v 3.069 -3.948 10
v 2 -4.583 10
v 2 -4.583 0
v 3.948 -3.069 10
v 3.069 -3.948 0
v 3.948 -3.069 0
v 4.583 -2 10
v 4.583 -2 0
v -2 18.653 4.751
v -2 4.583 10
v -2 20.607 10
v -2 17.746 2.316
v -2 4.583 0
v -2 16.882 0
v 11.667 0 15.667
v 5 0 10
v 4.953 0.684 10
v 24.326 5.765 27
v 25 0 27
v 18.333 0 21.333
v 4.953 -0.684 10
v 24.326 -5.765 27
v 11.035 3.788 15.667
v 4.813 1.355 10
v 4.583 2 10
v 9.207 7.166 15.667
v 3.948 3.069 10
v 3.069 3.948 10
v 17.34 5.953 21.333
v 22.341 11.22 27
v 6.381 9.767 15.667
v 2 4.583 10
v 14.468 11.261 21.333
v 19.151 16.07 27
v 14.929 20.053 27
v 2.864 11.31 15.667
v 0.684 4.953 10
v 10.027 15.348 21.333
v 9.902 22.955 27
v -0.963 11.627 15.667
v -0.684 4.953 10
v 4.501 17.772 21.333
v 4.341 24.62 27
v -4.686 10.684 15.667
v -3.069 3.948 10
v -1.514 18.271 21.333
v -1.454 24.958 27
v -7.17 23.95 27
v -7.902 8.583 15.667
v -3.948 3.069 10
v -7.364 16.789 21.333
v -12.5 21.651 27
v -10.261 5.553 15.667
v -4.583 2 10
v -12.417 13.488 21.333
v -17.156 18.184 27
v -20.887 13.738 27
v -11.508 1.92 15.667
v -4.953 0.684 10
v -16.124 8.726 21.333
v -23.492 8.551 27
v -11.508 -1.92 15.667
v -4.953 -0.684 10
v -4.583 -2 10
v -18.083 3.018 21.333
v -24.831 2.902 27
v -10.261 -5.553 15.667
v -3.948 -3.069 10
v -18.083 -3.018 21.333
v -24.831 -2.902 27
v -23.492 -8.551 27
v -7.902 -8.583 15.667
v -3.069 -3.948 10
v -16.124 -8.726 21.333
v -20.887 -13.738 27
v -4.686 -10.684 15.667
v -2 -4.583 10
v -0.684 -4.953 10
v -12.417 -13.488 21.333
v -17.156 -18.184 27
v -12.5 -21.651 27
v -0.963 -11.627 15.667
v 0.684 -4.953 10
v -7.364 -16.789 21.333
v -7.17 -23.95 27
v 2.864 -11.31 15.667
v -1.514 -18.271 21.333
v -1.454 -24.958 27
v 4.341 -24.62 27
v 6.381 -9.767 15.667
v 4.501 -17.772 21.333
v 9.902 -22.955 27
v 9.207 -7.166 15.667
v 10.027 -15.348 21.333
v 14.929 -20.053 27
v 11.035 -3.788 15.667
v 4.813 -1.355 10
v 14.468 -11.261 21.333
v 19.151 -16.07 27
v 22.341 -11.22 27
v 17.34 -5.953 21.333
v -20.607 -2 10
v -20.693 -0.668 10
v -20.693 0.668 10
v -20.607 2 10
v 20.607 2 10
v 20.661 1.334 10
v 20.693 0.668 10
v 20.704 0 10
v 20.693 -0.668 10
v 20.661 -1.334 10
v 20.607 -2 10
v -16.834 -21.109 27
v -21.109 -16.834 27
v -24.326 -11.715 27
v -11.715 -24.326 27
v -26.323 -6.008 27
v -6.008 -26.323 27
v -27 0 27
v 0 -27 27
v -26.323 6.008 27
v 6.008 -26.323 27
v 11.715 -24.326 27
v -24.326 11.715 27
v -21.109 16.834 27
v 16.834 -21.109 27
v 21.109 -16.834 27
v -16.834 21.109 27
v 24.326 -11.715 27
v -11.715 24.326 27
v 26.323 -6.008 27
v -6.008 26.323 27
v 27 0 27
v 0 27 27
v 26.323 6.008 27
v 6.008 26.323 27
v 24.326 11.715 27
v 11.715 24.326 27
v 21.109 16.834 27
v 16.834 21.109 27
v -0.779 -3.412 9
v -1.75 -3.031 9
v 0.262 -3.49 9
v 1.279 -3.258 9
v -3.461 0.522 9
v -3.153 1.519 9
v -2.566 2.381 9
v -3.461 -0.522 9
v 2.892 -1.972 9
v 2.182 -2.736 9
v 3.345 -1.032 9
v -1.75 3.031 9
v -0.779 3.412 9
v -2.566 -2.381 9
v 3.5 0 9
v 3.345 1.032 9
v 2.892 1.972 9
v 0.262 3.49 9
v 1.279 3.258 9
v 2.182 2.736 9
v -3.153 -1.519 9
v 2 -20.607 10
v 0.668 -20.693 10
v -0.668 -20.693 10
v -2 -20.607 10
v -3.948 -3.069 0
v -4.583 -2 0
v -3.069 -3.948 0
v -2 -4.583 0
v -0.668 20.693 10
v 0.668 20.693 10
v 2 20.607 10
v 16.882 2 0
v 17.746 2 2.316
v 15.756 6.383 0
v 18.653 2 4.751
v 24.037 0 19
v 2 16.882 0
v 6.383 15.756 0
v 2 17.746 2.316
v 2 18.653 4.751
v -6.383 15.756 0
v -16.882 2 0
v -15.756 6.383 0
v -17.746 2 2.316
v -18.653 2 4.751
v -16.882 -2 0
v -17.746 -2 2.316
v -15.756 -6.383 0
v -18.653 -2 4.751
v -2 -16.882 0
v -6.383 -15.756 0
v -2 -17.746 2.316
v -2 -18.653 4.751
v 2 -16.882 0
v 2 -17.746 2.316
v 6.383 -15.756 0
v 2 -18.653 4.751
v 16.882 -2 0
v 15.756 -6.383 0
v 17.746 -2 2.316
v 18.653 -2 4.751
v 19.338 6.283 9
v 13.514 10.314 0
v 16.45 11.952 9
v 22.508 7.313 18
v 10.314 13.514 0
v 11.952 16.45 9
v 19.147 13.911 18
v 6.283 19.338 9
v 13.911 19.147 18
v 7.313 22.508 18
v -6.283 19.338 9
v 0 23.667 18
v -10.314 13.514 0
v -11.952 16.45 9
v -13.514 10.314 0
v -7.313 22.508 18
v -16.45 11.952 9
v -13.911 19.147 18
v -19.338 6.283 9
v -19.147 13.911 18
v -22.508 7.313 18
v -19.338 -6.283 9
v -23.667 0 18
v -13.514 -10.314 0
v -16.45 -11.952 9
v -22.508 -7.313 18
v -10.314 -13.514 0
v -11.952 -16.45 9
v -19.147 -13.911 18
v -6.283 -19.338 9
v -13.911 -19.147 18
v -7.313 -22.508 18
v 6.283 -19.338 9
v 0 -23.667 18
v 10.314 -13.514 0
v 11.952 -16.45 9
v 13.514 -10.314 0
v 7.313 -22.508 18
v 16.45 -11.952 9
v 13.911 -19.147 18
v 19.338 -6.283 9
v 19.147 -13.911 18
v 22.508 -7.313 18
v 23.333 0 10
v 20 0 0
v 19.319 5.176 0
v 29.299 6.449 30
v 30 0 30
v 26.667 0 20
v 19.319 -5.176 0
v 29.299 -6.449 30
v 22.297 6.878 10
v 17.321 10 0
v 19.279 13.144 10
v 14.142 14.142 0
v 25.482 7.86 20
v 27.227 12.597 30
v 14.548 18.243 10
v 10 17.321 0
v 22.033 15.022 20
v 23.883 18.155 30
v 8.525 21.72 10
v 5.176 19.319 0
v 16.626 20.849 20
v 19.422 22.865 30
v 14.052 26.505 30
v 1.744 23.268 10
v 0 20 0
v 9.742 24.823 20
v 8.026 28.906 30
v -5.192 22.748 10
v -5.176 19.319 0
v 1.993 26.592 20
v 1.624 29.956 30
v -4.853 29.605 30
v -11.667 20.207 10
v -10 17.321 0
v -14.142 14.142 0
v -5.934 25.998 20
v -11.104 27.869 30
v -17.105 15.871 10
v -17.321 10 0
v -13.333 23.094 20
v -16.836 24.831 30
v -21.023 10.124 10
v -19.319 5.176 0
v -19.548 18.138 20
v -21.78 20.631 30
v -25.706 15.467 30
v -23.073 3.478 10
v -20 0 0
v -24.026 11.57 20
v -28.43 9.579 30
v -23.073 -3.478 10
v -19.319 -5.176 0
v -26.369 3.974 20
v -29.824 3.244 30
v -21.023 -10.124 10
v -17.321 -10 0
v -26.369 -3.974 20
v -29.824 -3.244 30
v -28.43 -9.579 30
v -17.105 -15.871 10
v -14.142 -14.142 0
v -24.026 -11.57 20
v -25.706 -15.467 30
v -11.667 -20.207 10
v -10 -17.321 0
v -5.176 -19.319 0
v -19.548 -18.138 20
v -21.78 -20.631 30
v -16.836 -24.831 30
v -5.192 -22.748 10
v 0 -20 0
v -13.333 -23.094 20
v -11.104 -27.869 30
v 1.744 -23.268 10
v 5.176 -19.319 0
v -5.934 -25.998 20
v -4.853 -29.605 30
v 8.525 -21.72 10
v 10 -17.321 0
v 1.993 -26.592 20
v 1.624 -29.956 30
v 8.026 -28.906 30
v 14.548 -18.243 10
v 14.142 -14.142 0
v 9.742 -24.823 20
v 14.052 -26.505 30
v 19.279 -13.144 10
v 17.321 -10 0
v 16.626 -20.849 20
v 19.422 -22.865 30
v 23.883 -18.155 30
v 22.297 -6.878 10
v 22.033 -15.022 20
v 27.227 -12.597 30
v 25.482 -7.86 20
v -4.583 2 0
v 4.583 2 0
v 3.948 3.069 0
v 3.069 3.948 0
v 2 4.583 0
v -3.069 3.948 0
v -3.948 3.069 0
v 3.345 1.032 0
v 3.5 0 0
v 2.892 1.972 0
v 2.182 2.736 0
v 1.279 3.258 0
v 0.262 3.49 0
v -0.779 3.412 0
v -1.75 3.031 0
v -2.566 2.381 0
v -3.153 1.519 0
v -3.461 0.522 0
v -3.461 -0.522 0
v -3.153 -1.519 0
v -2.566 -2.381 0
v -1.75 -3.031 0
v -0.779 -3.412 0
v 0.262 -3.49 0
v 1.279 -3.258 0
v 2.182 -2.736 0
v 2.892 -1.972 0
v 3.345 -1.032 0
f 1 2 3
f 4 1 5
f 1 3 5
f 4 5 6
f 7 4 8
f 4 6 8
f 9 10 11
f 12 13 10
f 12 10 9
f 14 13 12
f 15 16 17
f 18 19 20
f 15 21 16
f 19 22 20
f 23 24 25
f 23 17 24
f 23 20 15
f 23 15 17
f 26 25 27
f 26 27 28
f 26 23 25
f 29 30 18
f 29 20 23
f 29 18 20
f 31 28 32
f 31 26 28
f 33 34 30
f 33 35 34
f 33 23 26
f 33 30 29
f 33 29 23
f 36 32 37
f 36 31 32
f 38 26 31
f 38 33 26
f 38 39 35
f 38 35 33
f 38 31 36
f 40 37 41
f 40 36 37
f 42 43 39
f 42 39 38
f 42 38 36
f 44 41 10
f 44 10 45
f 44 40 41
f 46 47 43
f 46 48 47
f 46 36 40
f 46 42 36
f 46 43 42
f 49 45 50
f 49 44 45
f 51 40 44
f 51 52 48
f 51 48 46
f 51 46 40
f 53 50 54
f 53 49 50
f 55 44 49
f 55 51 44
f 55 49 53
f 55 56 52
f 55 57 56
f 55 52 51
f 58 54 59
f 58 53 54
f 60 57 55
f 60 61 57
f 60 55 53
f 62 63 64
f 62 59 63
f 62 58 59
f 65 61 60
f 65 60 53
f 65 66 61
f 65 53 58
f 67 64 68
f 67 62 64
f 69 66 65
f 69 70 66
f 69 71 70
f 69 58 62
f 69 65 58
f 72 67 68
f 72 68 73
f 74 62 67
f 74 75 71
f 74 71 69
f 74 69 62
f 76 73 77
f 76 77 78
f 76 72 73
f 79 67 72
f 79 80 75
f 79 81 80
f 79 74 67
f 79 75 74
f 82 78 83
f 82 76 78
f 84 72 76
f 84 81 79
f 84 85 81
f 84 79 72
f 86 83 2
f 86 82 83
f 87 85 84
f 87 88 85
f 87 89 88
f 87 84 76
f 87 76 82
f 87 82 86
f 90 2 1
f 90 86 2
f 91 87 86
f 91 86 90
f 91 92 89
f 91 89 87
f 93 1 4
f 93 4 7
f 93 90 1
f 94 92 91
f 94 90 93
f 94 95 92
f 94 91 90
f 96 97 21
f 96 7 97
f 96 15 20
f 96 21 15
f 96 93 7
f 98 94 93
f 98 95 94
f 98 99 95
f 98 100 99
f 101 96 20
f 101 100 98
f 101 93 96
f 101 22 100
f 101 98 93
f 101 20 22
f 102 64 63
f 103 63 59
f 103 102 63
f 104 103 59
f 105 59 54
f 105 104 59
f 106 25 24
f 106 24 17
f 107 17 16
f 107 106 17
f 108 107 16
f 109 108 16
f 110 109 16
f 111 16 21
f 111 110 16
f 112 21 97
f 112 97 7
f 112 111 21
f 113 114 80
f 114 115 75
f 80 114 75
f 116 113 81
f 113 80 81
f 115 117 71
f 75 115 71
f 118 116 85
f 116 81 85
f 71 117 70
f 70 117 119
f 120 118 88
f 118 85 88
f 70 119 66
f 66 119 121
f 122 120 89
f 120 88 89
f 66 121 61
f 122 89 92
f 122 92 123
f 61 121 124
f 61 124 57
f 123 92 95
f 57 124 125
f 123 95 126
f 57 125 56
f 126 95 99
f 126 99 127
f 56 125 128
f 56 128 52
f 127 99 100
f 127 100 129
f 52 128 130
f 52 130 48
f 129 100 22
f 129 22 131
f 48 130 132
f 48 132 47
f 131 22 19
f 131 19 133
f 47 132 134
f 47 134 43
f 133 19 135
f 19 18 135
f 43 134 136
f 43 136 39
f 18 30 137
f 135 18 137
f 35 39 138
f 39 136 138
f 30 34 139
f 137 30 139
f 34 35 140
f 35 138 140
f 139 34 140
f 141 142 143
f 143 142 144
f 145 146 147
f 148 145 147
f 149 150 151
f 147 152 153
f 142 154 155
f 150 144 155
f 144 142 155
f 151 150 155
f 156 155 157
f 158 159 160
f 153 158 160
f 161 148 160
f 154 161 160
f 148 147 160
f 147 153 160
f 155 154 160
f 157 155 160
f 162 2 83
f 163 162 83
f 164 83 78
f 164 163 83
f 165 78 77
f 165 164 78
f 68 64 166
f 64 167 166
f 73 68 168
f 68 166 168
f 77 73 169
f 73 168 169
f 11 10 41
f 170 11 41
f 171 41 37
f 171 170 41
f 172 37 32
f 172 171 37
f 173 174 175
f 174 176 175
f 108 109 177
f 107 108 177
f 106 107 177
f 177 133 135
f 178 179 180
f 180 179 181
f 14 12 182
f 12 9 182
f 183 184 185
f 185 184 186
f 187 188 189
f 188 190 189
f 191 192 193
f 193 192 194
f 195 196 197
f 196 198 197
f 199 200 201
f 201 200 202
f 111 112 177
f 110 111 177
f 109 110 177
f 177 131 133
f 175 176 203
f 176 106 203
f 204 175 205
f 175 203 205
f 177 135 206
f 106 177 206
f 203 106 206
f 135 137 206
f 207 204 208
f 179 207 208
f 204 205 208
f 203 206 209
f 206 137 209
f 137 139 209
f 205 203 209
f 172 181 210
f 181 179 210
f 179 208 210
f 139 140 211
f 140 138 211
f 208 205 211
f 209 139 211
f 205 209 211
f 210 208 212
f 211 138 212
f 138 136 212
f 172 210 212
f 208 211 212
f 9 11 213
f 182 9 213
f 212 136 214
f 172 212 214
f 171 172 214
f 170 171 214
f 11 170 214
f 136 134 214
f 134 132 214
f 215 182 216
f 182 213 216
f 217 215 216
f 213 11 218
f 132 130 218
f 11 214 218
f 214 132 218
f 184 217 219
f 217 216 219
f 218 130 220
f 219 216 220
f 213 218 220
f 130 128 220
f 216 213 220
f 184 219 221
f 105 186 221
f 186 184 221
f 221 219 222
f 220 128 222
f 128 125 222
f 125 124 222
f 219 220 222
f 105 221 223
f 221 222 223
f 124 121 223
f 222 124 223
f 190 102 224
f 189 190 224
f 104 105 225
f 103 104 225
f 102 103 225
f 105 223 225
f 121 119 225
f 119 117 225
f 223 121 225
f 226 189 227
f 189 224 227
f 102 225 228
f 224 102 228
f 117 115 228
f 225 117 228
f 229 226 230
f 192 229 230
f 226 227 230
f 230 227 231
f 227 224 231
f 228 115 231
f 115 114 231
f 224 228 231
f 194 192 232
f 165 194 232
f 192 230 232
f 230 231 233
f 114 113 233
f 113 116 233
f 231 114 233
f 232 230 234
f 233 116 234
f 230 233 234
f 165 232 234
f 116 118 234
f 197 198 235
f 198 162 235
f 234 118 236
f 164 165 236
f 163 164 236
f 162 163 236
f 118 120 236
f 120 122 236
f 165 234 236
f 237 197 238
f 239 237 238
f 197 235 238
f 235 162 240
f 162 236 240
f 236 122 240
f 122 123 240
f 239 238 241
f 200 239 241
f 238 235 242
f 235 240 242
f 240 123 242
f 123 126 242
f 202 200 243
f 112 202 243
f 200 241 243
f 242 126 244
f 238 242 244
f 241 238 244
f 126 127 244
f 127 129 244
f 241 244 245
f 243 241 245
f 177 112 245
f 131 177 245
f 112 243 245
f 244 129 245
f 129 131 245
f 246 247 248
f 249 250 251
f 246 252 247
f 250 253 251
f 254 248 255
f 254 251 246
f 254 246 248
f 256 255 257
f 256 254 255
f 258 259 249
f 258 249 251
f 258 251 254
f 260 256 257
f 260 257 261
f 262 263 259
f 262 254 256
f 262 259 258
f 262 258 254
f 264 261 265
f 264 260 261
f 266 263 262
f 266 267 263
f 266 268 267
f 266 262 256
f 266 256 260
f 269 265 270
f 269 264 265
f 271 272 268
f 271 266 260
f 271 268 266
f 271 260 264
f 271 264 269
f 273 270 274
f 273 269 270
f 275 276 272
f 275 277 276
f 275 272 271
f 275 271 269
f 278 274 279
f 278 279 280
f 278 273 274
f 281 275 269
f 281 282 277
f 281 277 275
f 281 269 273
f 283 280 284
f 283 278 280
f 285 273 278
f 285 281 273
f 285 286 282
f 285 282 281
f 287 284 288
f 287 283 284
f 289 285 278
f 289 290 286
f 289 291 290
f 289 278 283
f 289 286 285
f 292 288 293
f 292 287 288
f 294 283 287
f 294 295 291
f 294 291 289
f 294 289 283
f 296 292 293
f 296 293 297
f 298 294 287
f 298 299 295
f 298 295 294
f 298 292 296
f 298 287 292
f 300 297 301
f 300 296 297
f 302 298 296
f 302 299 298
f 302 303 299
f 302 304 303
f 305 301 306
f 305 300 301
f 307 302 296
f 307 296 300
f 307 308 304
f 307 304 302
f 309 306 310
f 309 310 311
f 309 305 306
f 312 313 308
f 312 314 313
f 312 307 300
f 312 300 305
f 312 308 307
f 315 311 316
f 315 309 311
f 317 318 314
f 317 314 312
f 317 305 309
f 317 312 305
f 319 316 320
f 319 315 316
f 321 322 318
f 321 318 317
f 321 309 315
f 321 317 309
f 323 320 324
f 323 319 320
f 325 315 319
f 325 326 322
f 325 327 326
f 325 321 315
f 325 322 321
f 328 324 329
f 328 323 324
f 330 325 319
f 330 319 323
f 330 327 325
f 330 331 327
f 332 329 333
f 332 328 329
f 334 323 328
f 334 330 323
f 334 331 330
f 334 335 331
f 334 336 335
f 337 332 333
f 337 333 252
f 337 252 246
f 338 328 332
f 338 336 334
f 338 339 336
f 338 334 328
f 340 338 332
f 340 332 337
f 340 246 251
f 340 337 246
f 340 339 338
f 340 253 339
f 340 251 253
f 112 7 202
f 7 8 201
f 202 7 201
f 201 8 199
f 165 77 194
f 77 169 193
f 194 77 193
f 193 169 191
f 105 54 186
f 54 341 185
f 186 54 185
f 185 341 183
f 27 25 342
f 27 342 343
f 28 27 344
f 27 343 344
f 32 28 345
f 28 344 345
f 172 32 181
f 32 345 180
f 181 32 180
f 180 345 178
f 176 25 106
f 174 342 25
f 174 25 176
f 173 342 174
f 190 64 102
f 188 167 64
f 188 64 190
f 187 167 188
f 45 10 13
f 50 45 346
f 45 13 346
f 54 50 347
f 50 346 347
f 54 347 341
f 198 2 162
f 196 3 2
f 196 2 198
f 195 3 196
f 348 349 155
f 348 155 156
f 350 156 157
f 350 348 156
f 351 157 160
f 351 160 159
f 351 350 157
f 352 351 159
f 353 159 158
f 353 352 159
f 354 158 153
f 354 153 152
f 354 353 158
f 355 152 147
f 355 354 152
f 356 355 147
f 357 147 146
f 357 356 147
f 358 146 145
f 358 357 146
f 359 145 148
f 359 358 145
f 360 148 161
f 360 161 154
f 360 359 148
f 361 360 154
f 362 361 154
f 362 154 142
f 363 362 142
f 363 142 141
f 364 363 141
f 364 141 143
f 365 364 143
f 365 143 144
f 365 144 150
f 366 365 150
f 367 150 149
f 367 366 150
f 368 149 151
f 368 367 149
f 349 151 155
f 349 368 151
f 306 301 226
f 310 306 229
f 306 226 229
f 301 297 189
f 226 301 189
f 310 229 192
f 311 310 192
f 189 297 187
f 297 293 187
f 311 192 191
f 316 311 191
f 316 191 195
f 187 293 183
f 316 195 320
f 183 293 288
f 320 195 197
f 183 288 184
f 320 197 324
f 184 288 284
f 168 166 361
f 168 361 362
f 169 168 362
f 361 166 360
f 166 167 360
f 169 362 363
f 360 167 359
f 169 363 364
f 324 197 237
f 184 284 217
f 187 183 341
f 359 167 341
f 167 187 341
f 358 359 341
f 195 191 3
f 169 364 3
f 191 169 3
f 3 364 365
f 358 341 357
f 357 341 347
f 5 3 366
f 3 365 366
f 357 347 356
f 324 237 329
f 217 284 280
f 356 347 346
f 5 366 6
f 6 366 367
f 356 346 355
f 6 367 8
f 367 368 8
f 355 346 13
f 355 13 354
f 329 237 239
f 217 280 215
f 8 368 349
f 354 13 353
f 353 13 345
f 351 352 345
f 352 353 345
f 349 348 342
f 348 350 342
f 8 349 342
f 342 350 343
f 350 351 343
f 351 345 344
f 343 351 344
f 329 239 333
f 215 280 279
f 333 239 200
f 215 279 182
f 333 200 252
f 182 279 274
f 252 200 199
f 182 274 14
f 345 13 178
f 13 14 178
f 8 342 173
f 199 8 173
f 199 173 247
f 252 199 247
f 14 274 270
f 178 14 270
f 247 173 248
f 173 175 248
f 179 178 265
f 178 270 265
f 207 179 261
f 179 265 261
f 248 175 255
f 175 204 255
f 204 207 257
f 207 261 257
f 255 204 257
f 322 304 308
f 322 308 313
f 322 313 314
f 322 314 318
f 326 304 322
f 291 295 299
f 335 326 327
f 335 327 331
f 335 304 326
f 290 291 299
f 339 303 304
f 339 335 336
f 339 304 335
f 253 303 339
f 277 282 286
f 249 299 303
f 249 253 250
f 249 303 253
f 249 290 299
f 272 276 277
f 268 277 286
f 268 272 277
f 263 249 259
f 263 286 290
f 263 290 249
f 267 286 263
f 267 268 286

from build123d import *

# Parameters (mm, degrees)
BOX001_W               = 4
BOX001_H               = 19
BOX001_DEPTH           = 10
BOX001_PLACEMENT_ANGLE = 90
POCKET001_DEPTH        = 5
BOX002_W               = 4
BOX002_H               = 19
BOX002_DEPTH           = 10
POCKET002_DEPTH        = 5
BOX003_W               = 4
BOX003_H               = 19
BOX003_DEPTH           = 10
BOX003_PLACEMENT_ANGLE = -90
POCKET003_DEPTH        = 5
BOX_W                  = 4
BOX_H                  = 19
BOX_DEPTH              = 10
POCKET_DEPTH           = 5
CYLINDER_R             = 3.5
CYLINDER_DEPTH         = 9
CYLINDER001_R          = 5
CYLINDER001_DEPTH      = 12


with BuildPart() as pocket001:
    # Box001 → Box001 (new body)
    with BuildSketch(Plane.XY):
        with Locations((2, 9.5)):
            Rectangle(BOX001_W, BOX001_H)
    extrude(amount=BOX001_DEPTH)


with BuildPart() as pocket001_1:
    # Box001 placement: moved
    add(pocket001.part.moved(Location((-4, -2, 0))).rotate(Axis((-4, -2, 0), (0, 0, 1)), BOX001_PLACEMENT_ANGLE))

    # Sketch001 → Pocket001 (cut)
    with BuildSketch(Plane(origin=(-4, 2, 0), x_dir=(-1, 0, 0), z_dir=(0, 1, 0))):
        Polygon((14.366066, 0), (19, 0), (19, 10), (17.795696, 10), align=None)
    extrude(amount=-POCKET001_DEPTH, mode=Mode.SUBTRACT)


with BuildPart() as pocket002:
    # Box002 → Box002 (new body)
    with BuildSketch(Plane(origin=(2, -4, 0), x_dir=(-1, 0, 0), z_dir=(0, 0, 1))):
        with Locations((2, 9.5)):
            Rectangle(BOX002_W, BOX002_H)
    extrude(amount=BOX002_DEPTH)

    # Sketch002 → Pocket002 (cut)
    with BuildSketch(Plane(origin=(-2, -4, 0), x_dir=(0, -1, 0), z_dir=(-1, 0, 0))):
        Polygon((14.366066, 0), (19, 0), (19, 10), (17.795696, 10), align=None)
    extrude(amount=-POCKET002_DEPTH, mode=Mode.SUBTRACT)


with BuildPart() as pocket003:
    # Box003 → Box003 (new body)
    with BuildSketch(Plane.XY):
        with Locations((2, 9.5)):
            Rectangle(BOX003_W, BOX003_H)
    extrude(amount=BOX003_DEPTH)


with BuildPart() as pocket003_1:
    # Box003 placement: moved
    add(pocket003.part.moved(Location((4, 2, 0))).rotate(Axis((4, 2, 0), (0, 0, 1)), BOX003_PLACEMENT_ANGLE))

    # Sketch003 → Pocket003 (cut)
    with BuildSketch(Plane(origin=(4, -2, 0), x_dir=(1, 0, 0), z_dir=(0, -1, 0))):
        Polygon((14.366066, 0), (19, 0), (19, 10), (17.795696, 10), align=None)
    extrude(amount=-POCKET003_DEPTH, mode=Mode.SUBTRACT)


with BuildPart() as fusion:
    # Box → Box (new body)
    with BuildSketch(Plane(origin=(-2, 4, 0), x_dir=(1, 0, 0), z_dir=(0, 0, 1))):
        with Locations((2, 9.5)):
            Rectangle(BOX_W, BOX_H)
    extrude(amount=BOX_DEPTH)

    # Sketch → Pocket (cut)
    with BuildSketch(Plane(origin=(2, 4, 0), x_dir=(0, 1, 0), z_dir=(1, 0, 0))):
        Polygon((14.366066, 0), (19, 0), (19, 10), (17.795696, 10), align=None)
    extrude(amount=-POCKET_DEPTH, mode=Mode.SUBTRACT)

    # Fusion: union Pocket001, Pocket002, Pocket003
    add(pocket001_1.part)
    add(pocket002.part)
    add(pocket003_1.part)


with BuildPart() as soporte:
    # Cone002 → Cone002 (revolve)
    with BuildSketch(Plane(origin=(0, 0, 10), x_dir=(1, 0, 0), z_dir=(0, -1, 0))):
        Polygon((0, 0), (5, 0), (25, 17), (0, 17), align=None)
    revolve(axis=Axis((0, 0, 10), (0, 0, 1)))


with BuildPart() as cilindro:
    # Cylinder → Cylinder (new body)
    with BuildSketch(Plane.XY):
        Circle(CYLINDER_R)
    extrude(amount=CYLINDER_DEPTH)


with BuildPart() as fusion001:
    # Cylinder001 → Cylinder001 (new body)
    with BuildSketch(Plane.XY):
        Circle(CYLINDER001_R)
    extrude(amount=CYLINDER001_DEPTH)

    # Cut001: cut Cilindro
    add(cilindro.part, mode=Mode.SUBTRACT)

    # Fusion001: union Fusion, Soporte
    add(fusion.part)
    add(soporte.part)


with BuildPart() as cono001:
    # Cone001 → Cone001 (revolve)
    with BuildSketch(Plane.XZ):
        Polygon((0, 0), (17, 0), (27, 27), (0, 27), align=None)
    revolve(axis=Axis((0, 0, 0), (0, 0, 1)))


with BuildPart() as tapon_olla:
    # Cone → Cone (revolve)
    with BuildSketch(Plane.XZ):
        Polygon((0, 0), (20, 0), (30, 30), (0, 30), align=None)
    revolve(axis=Axis((0, 0, 0), (0, 0, 1)))

    # Cut: cut Cono001
    add(cono001.part, mode=Mode.SUBTRACT)

    # Fusion002: union Fusion001
    add(fusion001.part)


solid = tapon_olla.part
